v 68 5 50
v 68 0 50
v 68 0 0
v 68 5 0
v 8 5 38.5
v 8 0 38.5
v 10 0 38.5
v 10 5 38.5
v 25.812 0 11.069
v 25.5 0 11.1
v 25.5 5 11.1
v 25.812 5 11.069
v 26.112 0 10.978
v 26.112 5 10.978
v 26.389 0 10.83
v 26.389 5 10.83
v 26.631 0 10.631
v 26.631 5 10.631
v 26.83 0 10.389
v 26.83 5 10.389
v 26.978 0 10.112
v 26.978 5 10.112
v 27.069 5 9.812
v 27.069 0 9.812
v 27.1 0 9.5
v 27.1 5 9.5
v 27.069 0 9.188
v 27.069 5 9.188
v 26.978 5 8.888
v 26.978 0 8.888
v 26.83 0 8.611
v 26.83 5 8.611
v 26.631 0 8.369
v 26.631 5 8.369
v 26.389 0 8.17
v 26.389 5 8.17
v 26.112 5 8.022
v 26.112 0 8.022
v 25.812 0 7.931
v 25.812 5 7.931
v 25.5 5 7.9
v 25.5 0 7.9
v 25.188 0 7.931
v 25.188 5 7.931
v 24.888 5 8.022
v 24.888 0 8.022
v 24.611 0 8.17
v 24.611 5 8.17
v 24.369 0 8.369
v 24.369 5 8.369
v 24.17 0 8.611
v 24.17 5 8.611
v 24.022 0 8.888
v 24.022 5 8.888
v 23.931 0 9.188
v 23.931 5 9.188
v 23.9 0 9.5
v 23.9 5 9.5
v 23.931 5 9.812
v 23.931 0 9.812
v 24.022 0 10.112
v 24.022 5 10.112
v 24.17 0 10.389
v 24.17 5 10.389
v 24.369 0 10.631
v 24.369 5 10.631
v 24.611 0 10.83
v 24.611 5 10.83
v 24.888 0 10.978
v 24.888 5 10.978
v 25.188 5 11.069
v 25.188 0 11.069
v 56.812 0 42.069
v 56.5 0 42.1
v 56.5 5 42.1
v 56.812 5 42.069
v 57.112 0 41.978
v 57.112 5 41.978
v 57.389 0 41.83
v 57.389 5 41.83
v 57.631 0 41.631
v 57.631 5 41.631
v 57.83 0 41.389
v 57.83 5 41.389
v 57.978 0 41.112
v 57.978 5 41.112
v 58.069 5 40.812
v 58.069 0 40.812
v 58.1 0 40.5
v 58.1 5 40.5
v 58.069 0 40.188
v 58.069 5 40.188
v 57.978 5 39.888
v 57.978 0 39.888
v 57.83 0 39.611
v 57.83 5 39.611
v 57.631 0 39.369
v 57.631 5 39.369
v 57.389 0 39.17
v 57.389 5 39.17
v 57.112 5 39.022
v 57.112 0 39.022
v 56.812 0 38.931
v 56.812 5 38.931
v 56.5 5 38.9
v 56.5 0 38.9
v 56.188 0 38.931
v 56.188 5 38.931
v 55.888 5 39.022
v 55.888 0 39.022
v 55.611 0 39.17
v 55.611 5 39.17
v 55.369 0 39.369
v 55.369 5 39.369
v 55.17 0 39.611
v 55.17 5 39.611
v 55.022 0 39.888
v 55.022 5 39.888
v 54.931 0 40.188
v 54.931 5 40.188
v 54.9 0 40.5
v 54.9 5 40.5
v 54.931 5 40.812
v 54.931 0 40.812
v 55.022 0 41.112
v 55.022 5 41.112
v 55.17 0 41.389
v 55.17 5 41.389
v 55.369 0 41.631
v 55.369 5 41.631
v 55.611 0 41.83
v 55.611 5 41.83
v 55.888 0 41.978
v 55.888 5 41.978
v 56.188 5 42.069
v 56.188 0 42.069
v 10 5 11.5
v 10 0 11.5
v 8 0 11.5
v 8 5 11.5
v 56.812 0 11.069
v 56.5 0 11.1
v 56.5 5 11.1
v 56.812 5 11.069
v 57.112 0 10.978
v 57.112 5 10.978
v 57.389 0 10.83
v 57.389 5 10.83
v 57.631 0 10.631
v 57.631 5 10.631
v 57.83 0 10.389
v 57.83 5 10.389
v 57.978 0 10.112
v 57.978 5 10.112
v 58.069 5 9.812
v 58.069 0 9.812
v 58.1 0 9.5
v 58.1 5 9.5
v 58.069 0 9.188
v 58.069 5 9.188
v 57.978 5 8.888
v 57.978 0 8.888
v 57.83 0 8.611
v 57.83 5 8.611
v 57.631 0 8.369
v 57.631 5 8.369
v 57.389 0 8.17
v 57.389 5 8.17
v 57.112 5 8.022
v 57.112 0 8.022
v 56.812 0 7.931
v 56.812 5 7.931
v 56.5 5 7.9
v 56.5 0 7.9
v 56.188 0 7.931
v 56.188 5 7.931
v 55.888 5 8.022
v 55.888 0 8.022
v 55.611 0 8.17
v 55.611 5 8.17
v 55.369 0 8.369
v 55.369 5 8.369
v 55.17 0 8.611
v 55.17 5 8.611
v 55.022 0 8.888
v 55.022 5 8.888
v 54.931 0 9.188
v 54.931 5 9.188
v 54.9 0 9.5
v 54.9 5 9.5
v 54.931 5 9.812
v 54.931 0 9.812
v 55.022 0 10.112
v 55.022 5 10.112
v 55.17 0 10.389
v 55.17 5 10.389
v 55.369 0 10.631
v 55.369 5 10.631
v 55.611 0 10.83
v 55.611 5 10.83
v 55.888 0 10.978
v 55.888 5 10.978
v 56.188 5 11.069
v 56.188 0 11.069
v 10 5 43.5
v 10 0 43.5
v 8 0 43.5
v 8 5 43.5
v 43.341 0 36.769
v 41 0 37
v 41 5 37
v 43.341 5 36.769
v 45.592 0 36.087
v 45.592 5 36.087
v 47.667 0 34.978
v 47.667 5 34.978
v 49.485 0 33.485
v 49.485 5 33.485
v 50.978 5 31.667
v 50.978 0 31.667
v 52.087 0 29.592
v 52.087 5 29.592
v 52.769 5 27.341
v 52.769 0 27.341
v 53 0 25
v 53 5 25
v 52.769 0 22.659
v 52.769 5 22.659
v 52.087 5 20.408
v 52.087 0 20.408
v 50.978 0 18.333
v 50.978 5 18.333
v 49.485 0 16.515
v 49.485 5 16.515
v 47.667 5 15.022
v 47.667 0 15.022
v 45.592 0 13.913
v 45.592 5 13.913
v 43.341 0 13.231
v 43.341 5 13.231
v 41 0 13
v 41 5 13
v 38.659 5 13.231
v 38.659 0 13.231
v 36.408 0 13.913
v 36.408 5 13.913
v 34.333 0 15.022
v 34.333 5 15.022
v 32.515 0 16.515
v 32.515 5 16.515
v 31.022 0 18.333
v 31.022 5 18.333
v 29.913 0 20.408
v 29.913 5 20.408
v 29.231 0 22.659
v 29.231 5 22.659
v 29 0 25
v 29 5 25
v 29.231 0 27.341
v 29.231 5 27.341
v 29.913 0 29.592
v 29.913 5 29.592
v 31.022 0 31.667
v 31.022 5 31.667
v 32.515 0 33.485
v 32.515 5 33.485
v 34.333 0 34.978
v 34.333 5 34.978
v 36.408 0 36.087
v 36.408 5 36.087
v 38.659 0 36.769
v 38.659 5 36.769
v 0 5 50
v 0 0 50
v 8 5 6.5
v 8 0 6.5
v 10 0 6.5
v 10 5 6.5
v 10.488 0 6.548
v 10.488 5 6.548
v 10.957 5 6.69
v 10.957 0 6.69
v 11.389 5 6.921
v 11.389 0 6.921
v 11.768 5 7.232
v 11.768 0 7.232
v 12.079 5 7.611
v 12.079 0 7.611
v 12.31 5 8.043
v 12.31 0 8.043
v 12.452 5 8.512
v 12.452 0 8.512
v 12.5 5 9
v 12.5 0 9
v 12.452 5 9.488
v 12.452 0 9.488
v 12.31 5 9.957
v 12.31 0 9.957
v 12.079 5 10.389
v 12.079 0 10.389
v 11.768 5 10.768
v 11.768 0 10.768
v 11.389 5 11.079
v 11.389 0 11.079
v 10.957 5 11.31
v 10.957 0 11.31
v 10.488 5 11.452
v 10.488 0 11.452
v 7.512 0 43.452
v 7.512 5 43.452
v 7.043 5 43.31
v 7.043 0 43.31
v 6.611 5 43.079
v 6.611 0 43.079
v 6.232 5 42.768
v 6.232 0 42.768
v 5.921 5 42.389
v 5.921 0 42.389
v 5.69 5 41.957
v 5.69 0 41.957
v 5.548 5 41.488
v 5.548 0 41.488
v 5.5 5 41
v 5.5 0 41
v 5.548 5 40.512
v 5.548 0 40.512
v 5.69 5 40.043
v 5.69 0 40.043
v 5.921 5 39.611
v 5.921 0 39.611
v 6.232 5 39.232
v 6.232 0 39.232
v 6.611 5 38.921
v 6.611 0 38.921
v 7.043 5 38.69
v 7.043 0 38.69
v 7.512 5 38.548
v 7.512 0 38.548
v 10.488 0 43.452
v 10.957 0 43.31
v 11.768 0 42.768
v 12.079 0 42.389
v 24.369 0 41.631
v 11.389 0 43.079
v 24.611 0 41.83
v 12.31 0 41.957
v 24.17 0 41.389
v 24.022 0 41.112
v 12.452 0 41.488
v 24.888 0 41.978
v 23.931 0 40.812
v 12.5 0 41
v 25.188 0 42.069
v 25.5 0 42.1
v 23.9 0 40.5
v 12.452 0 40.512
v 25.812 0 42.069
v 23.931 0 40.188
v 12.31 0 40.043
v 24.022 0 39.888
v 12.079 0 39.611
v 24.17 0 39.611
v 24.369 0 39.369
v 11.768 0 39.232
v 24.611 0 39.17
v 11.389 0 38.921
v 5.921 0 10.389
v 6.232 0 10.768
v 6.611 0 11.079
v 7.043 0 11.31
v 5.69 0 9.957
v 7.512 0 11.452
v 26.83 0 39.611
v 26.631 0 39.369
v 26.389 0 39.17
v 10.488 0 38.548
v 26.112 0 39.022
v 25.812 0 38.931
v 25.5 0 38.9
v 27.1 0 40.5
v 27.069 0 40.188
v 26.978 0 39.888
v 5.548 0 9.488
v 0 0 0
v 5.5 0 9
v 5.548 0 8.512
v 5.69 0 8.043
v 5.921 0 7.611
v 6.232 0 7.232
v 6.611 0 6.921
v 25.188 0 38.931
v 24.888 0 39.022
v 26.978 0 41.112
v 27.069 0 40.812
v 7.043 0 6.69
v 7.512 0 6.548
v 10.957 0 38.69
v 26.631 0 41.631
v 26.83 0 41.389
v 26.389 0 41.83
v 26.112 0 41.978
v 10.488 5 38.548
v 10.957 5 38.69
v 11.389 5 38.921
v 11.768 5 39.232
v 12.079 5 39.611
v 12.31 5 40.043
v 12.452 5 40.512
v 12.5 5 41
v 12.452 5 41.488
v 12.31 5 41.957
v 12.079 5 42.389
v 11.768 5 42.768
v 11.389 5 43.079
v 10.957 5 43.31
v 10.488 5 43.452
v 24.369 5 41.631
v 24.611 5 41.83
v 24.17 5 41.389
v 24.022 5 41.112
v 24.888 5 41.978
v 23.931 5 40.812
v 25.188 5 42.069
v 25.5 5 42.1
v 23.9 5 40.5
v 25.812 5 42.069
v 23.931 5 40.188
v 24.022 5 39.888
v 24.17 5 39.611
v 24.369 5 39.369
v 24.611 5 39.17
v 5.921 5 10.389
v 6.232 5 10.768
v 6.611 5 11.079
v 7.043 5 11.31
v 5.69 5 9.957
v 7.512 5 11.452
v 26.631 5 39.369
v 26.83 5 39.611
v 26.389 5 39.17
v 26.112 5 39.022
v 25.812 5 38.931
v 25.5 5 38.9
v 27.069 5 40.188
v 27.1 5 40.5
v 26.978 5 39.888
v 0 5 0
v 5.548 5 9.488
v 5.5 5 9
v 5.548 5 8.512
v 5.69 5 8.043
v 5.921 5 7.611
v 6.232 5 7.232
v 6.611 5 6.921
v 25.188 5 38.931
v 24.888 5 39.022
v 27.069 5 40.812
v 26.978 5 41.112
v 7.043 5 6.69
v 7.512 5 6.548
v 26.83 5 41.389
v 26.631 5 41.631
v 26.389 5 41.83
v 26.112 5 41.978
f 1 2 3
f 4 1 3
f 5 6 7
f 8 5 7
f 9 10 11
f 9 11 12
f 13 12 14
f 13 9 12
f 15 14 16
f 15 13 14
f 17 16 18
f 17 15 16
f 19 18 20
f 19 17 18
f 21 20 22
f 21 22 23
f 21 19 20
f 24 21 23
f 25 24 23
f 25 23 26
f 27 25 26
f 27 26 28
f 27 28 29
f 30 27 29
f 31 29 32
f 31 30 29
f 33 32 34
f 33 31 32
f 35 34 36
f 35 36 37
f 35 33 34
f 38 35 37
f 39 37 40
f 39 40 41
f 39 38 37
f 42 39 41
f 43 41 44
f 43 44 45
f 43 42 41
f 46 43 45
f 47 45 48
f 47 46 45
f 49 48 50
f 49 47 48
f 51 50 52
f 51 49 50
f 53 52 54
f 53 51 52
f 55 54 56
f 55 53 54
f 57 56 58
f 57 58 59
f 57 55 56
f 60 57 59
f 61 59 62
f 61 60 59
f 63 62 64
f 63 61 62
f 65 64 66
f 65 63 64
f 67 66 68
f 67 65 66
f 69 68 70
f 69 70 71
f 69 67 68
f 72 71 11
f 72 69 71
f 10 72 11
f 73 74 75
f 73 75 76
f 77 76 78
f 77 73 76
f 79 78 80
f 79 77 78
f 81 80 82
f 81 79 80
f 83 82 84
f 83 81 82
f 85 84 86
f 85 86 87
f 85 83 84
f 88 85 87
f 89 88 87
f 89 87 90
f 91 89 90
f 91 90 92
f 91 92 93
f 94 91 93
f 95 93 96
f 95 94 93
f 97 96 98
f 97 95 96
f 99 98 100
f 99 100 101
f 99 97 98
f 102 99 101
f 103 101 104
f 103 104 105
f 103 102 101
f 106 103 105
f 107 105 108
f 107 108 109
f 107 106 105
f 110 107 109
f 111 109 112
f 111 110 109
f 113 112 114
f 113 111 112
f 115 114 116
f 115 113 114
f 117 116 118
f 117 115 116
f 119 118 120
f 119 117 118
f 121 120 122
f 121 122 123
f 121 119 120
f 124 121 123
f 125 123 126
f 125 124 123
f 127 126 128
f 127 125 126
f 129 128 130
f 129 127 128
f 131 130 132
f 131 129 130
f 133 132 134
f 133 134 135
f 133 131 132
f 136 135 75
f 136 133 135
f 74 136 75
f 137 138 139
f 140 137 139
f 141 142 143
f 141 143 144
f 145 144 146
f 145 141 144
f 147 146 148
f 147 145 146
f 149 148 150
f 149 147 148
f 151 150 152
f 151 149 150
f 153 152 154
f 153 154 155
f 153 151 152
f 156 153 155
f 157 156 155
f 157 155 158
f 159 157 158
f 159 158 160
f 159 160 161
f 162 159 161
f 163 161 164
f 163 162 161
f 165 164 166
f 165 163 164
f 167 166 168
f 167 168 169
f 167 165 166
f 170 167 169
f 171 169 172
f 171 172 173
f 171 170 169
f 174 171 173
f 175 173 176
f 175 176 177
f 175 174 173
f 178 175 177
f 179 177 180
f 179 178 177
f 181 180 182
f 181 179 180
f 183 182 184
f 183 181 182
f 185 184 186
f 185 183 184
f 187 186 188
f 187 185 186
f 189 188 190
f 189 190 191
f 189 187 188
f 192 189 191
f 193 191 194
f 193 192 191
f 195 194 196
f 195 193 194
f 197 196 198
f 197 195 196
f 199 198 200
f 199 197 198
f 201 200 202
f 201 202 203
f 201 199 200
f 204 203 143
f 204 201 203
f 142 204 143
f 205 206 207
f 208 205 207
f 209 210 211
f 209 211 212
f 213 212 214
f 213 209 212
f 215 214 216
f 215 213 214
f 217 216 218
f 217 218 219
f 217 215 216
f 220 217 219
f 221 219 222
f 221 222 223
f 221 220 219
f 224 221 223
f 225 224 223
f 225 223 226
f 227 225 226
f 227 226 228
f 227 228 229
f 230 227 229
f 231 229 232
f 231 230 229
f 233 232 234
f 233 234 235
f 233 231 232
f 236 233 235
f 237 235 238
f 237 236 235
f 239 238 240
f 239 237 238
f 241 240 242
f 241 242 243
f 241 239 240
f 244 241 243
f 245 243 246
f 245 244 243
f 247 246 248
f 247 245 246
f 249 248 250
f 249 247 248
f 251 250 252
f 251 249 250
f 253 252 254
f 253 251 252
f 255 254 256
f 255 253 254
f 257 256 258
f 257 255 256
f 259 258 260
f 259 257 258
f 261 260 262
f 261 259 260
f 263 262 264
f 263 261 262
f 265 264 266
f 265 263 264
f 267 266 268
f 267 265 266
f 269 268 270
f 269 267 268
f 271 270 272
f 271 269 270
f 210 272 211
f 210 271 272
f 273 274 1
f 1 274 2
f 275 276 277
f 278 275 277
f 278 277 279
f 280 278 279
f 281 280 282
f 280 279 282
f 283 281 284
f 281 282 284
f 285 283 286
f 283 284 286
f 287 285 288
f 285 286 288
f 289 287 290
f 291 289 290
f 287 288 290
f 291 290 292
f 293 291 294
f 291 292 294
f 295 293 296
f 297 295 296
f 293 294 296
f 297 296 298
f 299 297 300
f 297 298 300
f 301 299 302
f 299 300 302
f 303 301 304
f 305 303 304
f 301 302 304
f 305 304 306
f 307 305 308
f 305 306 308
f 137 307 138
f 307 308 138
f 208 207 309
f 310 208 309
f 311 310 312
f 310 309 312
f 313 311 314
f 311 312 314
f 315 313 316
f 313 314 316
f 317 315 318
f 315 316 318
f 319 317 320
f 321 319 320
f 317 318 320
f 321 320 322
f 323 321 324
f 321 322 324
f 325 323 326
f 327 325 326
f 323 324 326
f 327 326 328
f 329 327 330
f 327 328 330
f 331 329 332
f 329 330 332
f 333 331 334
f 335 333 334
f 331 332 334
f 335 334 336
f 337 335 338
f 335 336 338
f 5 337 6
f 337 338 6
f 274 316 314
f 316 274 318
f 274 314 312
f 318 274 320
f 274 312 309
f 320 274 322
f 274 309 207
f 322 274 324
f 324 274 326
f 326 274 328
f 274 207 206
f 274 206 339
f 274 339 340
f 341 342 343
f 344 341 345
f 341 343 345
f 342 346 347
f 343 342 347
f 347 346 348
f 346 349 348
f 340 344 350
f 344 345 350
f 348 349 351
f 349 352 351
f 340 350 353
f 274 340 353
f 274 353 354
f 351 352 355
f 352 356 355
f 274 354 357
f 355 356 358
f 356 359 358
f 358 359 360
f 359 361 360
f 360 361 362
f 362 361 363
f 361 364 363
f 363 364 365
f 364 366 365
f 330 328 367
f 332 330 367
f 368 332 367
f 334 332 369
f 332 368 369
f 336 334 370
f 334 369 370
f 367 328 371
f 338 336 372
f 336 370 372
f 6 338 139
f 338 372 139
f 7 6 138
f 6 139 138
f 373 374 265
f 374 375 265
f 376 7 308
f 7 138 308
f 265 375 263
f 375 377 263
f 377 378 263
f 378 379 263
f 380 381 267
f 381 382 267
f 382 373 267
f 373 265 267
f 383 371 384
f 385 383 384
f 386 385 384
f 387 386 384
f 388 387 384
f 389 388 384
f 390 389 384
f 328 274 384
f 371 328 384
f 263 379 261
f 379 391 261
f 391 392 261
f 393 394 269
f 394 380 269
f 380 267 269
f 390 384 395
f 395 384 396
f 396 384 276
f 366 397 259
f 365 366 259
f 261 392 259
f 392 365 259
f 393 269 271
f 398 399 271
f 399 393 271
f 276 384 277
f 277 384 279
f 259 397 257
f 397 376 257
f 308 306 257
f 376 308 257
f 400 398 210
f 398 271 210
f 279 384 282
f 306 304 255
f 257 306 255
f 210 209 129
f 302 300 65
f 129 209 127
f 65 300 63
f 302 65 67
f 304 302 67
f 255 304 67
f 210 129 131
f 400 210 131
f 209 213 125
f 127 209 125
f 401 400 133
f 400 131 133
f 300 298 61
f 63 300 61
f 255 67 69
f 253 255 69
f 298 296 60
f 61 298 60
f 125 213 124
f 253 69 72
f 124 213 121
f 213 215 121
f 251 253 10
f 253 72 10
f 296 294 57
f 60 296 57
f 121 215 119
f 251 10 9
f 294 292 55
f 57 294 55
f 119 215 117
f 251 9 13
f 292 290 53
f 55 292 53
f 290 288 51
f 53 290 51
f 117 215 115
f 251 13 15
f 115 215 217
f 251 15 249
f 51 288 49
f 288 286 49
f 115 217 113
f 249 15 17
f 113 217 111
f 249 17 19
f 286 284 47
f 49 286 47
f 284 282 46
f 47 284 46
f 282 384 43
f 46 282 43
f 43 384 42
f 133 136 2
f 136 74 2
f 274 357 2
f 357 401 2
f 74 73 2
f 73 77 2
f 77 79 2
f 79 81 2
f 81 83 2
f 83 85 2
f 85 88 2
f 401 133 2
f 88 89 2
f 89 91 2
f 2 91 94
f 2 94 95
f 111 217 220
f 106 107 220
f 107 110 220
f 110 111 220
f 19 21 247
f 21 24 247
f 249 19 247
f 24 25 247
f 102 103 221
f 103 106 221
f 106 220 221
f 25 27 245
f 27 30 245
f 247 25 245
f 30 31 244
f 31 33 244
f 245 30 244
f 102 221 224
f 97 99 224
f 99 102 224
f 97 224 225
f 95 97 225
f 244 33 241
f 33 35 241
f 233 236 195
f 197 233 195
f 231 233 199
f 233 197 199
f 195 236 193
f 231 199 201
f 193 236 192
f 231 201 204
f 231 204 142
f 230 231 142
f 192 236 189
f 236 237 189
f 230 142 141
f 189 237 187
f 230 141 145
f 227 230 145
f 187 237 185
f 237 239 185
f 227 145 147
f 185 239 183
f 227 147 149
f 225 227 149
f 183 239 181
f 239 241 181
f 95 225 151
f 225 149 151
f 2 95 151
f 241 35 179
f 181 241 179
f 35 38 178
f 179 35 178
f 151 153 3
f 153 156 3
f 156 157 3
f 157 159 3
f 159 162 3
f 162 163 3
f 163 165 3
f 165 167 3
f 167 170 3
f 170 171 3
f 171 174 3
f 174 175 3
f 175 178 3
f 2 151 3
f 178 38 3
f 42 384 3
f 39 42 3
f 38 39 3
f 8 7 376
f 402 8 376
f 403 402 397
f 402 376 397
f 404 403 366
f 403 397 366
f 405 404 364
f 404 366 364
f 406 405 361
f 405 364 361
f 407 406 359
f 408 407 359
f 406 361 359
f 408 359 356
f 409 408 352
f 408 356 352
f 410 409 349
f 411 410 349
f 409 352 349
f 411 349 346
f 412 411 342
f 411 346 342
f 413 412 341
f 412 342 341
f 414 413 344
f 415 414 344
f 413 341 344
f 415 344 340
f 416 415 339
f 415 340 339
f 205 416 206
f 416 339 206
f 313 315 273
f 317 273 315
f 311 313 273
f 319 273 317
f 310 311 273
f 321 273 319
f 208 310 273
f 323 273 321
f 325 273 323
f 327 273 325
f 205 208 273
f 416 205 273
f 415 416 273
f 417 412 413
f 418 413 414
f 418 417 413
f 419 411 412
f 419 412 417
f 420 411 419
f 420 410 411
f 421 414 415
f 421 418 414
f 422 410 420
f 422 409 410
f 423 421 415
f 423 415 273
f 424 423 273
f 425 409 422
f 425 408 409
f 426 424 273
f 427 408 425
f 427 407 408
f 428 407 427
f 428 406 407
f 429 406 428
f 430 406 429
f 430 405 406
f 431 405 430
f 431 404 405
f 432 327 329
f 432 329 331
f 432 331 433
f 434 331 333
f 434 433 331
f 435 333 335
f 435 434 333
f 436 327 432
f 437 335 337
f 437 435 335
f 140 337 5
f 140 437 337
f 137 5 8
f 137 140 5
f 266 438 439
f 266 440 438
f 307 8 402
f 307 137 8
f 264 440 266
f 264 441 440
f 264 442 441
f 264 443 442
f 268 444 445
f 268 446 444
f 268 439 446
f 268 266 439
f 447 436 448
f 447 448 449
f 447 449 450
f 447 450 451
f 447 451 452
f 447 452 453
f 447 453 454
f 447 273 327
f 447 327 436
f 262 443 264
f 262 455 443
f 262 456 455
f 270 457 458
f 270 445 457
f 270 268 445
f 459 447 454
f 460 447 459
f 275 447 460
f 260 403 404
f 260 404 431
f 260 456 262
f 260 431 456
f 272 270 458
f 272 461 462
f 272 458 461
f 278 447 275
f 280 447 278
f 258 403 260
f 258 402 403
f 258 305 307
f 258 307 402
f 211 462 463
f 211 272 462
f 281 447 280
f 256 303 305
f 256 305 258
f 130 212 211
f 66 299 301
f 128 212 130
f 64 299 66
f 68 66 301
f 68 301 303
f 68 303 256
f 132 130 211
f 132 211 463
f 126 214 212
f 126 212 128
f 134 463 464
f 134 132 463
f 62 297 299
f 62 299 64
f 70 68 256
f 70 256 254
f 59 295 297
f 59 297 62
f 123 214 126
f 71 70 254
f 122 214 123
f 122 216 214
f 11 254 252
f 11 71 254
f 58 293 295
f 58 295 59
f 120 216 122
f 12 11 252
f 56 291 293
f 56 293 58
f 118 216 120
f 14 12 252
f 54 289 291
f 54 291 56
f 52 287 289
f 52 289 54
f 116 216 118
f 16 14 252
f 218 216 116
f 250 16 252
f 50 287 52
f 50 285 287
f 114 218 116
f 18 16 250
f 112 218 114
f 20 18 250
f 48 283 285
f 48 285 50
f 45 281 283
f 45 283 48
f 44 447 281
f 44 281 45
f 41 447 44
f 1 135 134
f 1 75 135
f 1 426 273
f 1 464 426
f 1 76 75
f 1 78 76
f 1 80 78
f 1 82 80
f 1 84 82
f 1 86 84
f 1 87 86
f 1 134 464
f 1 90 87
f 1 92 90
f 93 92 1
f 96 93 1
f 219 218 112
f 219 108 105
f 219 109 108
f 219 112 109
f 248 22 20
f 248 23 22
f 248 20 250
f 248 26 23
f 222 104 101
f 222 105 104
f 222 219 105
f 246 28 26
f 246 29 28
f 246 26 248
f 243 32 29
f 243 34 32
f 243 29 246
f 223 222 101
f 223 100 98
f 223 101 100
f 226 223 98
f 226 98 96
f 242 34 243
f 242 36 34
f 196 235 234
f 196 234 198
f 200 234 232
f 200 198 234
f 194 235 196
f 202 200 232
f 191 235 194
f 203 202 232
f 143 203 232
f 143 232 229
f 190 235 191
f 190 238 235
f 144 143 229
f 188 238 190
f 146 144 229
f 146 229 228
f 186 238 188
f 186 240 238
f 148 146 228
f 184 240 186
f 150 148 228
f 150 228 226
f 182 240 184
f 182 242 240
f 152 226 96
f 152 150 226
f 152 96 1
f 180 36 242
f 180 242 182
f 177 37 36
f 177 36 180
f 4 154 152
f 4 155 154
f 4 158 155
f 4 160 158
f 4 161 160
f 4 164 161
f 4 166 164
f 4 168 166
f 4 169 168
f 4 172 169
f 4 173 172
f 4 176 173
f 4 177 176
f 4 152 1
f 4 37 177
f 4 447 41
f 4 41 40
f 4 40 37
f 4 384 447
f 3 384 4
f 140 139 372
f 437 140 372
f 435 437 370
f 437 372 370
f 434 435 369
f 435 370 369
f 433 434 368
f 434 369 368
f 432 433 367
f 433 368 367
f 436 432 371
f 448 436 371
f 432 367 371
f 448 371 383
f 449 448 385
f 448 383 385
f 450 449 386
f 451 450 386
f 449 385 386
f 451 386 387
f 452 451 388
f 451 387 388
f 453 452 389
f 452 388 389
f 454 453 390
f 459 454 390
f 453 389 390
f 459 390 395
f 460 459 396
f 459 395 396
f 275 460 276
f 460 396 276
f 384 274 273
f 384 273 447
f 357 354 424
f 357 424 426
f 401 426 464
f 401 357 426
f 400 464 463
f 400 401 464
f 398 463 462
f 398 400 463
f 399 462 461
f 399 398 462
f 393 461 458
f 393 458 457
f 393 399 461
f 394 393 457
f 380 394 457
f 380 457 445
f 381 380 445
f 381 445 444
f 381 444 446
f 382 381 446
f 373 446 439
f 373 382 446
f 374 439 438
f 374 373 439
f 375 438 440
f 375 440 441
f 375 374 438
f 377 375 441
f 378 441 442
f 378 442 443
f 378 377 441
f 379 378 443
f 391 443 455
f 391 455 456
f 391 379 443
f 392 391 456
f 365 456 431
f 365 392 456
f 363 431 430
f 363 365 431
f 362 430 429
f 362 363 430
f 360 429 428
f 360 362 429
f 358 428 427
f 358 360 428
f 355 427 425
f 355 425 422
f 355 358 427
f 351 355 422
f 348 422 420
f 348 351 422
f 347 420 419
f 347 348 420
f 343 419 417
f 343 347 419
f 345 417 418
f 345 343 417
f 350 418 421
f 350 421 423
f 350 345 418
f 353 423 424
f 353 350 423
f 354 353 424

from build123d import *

# Parameters (mm, degrees)
SKETCH_1_W      = 68
SKETCH_1_H      = 50
SKETCH_1_R      = 12
SKETCH_1_R_2    = 1.6
EXTRUDE_1_DEPTH = 5


with BuildPart() as part:
    # 草图1 → 凸台-拉伸1 (new body)
    with BuildSketch(Plane(origin=(0, 0, 0), x_dir=(1, 0, 0), z_dir=(0, 1, 0))):
        with Locations((34, -25)):
            Rectangle(SKETCH_1_W, SKETCH_1_H)
        with Locations(Location((41, -25, 0), (0, 0, 270))):
            Circle(SKETCH_1_R, mode=Mode.SUBTRACT)
        with Locations(Location((25.5, -9.5, 0), (0, 0, 270))):
            Circle(SKETCH_1_R_2, mode=Mode.SUBTRACT)
        with Locations(Location((56.5, -9.5, 0), (0, 0, 270))):
            Circle(SKETCH_1_R_2, mode=Mode.SUBTRACT)
        with Locations(Location((56.5, -40.5, 0), (0, 0, 270))):
            Circle(SKETCH_1_R_2, mode=Mode.SUBTRACT)
        with Locations(Location((25.5, -40.5, 0), (0, 0, 270))):
            Circle(SKETCH_1_R_2, mode=Mode.SUBTRACT)
        with BuildLine():
            Line((8, -6.5), (10, -6.5))
            ThreePointArc((10, -6.5), (12.5, -9), (10, -11.5))
            Line((10, -11.5), (8, -11.5))
            ThreePointArc((8, -11.5), (5.5, -9), (8, -6.5))
        make_face(mode=Mode.SUBTRACT)
        with BuildLine():
            Line((8, -38.5), (10, -38.5))
            ThreePointArc((10, -38.5), (12.5, -41), (10, -43.5))
            Line((10, -43.5), (8, -43.5))
            ThreePointArc((8, -43.5), (5.5, -41), (8, -38.5))
        make_face(mode=Mode.SUBTRACT)
    extrude(amount=EXTRUDE_1_DEPTH)


solid = part.part
